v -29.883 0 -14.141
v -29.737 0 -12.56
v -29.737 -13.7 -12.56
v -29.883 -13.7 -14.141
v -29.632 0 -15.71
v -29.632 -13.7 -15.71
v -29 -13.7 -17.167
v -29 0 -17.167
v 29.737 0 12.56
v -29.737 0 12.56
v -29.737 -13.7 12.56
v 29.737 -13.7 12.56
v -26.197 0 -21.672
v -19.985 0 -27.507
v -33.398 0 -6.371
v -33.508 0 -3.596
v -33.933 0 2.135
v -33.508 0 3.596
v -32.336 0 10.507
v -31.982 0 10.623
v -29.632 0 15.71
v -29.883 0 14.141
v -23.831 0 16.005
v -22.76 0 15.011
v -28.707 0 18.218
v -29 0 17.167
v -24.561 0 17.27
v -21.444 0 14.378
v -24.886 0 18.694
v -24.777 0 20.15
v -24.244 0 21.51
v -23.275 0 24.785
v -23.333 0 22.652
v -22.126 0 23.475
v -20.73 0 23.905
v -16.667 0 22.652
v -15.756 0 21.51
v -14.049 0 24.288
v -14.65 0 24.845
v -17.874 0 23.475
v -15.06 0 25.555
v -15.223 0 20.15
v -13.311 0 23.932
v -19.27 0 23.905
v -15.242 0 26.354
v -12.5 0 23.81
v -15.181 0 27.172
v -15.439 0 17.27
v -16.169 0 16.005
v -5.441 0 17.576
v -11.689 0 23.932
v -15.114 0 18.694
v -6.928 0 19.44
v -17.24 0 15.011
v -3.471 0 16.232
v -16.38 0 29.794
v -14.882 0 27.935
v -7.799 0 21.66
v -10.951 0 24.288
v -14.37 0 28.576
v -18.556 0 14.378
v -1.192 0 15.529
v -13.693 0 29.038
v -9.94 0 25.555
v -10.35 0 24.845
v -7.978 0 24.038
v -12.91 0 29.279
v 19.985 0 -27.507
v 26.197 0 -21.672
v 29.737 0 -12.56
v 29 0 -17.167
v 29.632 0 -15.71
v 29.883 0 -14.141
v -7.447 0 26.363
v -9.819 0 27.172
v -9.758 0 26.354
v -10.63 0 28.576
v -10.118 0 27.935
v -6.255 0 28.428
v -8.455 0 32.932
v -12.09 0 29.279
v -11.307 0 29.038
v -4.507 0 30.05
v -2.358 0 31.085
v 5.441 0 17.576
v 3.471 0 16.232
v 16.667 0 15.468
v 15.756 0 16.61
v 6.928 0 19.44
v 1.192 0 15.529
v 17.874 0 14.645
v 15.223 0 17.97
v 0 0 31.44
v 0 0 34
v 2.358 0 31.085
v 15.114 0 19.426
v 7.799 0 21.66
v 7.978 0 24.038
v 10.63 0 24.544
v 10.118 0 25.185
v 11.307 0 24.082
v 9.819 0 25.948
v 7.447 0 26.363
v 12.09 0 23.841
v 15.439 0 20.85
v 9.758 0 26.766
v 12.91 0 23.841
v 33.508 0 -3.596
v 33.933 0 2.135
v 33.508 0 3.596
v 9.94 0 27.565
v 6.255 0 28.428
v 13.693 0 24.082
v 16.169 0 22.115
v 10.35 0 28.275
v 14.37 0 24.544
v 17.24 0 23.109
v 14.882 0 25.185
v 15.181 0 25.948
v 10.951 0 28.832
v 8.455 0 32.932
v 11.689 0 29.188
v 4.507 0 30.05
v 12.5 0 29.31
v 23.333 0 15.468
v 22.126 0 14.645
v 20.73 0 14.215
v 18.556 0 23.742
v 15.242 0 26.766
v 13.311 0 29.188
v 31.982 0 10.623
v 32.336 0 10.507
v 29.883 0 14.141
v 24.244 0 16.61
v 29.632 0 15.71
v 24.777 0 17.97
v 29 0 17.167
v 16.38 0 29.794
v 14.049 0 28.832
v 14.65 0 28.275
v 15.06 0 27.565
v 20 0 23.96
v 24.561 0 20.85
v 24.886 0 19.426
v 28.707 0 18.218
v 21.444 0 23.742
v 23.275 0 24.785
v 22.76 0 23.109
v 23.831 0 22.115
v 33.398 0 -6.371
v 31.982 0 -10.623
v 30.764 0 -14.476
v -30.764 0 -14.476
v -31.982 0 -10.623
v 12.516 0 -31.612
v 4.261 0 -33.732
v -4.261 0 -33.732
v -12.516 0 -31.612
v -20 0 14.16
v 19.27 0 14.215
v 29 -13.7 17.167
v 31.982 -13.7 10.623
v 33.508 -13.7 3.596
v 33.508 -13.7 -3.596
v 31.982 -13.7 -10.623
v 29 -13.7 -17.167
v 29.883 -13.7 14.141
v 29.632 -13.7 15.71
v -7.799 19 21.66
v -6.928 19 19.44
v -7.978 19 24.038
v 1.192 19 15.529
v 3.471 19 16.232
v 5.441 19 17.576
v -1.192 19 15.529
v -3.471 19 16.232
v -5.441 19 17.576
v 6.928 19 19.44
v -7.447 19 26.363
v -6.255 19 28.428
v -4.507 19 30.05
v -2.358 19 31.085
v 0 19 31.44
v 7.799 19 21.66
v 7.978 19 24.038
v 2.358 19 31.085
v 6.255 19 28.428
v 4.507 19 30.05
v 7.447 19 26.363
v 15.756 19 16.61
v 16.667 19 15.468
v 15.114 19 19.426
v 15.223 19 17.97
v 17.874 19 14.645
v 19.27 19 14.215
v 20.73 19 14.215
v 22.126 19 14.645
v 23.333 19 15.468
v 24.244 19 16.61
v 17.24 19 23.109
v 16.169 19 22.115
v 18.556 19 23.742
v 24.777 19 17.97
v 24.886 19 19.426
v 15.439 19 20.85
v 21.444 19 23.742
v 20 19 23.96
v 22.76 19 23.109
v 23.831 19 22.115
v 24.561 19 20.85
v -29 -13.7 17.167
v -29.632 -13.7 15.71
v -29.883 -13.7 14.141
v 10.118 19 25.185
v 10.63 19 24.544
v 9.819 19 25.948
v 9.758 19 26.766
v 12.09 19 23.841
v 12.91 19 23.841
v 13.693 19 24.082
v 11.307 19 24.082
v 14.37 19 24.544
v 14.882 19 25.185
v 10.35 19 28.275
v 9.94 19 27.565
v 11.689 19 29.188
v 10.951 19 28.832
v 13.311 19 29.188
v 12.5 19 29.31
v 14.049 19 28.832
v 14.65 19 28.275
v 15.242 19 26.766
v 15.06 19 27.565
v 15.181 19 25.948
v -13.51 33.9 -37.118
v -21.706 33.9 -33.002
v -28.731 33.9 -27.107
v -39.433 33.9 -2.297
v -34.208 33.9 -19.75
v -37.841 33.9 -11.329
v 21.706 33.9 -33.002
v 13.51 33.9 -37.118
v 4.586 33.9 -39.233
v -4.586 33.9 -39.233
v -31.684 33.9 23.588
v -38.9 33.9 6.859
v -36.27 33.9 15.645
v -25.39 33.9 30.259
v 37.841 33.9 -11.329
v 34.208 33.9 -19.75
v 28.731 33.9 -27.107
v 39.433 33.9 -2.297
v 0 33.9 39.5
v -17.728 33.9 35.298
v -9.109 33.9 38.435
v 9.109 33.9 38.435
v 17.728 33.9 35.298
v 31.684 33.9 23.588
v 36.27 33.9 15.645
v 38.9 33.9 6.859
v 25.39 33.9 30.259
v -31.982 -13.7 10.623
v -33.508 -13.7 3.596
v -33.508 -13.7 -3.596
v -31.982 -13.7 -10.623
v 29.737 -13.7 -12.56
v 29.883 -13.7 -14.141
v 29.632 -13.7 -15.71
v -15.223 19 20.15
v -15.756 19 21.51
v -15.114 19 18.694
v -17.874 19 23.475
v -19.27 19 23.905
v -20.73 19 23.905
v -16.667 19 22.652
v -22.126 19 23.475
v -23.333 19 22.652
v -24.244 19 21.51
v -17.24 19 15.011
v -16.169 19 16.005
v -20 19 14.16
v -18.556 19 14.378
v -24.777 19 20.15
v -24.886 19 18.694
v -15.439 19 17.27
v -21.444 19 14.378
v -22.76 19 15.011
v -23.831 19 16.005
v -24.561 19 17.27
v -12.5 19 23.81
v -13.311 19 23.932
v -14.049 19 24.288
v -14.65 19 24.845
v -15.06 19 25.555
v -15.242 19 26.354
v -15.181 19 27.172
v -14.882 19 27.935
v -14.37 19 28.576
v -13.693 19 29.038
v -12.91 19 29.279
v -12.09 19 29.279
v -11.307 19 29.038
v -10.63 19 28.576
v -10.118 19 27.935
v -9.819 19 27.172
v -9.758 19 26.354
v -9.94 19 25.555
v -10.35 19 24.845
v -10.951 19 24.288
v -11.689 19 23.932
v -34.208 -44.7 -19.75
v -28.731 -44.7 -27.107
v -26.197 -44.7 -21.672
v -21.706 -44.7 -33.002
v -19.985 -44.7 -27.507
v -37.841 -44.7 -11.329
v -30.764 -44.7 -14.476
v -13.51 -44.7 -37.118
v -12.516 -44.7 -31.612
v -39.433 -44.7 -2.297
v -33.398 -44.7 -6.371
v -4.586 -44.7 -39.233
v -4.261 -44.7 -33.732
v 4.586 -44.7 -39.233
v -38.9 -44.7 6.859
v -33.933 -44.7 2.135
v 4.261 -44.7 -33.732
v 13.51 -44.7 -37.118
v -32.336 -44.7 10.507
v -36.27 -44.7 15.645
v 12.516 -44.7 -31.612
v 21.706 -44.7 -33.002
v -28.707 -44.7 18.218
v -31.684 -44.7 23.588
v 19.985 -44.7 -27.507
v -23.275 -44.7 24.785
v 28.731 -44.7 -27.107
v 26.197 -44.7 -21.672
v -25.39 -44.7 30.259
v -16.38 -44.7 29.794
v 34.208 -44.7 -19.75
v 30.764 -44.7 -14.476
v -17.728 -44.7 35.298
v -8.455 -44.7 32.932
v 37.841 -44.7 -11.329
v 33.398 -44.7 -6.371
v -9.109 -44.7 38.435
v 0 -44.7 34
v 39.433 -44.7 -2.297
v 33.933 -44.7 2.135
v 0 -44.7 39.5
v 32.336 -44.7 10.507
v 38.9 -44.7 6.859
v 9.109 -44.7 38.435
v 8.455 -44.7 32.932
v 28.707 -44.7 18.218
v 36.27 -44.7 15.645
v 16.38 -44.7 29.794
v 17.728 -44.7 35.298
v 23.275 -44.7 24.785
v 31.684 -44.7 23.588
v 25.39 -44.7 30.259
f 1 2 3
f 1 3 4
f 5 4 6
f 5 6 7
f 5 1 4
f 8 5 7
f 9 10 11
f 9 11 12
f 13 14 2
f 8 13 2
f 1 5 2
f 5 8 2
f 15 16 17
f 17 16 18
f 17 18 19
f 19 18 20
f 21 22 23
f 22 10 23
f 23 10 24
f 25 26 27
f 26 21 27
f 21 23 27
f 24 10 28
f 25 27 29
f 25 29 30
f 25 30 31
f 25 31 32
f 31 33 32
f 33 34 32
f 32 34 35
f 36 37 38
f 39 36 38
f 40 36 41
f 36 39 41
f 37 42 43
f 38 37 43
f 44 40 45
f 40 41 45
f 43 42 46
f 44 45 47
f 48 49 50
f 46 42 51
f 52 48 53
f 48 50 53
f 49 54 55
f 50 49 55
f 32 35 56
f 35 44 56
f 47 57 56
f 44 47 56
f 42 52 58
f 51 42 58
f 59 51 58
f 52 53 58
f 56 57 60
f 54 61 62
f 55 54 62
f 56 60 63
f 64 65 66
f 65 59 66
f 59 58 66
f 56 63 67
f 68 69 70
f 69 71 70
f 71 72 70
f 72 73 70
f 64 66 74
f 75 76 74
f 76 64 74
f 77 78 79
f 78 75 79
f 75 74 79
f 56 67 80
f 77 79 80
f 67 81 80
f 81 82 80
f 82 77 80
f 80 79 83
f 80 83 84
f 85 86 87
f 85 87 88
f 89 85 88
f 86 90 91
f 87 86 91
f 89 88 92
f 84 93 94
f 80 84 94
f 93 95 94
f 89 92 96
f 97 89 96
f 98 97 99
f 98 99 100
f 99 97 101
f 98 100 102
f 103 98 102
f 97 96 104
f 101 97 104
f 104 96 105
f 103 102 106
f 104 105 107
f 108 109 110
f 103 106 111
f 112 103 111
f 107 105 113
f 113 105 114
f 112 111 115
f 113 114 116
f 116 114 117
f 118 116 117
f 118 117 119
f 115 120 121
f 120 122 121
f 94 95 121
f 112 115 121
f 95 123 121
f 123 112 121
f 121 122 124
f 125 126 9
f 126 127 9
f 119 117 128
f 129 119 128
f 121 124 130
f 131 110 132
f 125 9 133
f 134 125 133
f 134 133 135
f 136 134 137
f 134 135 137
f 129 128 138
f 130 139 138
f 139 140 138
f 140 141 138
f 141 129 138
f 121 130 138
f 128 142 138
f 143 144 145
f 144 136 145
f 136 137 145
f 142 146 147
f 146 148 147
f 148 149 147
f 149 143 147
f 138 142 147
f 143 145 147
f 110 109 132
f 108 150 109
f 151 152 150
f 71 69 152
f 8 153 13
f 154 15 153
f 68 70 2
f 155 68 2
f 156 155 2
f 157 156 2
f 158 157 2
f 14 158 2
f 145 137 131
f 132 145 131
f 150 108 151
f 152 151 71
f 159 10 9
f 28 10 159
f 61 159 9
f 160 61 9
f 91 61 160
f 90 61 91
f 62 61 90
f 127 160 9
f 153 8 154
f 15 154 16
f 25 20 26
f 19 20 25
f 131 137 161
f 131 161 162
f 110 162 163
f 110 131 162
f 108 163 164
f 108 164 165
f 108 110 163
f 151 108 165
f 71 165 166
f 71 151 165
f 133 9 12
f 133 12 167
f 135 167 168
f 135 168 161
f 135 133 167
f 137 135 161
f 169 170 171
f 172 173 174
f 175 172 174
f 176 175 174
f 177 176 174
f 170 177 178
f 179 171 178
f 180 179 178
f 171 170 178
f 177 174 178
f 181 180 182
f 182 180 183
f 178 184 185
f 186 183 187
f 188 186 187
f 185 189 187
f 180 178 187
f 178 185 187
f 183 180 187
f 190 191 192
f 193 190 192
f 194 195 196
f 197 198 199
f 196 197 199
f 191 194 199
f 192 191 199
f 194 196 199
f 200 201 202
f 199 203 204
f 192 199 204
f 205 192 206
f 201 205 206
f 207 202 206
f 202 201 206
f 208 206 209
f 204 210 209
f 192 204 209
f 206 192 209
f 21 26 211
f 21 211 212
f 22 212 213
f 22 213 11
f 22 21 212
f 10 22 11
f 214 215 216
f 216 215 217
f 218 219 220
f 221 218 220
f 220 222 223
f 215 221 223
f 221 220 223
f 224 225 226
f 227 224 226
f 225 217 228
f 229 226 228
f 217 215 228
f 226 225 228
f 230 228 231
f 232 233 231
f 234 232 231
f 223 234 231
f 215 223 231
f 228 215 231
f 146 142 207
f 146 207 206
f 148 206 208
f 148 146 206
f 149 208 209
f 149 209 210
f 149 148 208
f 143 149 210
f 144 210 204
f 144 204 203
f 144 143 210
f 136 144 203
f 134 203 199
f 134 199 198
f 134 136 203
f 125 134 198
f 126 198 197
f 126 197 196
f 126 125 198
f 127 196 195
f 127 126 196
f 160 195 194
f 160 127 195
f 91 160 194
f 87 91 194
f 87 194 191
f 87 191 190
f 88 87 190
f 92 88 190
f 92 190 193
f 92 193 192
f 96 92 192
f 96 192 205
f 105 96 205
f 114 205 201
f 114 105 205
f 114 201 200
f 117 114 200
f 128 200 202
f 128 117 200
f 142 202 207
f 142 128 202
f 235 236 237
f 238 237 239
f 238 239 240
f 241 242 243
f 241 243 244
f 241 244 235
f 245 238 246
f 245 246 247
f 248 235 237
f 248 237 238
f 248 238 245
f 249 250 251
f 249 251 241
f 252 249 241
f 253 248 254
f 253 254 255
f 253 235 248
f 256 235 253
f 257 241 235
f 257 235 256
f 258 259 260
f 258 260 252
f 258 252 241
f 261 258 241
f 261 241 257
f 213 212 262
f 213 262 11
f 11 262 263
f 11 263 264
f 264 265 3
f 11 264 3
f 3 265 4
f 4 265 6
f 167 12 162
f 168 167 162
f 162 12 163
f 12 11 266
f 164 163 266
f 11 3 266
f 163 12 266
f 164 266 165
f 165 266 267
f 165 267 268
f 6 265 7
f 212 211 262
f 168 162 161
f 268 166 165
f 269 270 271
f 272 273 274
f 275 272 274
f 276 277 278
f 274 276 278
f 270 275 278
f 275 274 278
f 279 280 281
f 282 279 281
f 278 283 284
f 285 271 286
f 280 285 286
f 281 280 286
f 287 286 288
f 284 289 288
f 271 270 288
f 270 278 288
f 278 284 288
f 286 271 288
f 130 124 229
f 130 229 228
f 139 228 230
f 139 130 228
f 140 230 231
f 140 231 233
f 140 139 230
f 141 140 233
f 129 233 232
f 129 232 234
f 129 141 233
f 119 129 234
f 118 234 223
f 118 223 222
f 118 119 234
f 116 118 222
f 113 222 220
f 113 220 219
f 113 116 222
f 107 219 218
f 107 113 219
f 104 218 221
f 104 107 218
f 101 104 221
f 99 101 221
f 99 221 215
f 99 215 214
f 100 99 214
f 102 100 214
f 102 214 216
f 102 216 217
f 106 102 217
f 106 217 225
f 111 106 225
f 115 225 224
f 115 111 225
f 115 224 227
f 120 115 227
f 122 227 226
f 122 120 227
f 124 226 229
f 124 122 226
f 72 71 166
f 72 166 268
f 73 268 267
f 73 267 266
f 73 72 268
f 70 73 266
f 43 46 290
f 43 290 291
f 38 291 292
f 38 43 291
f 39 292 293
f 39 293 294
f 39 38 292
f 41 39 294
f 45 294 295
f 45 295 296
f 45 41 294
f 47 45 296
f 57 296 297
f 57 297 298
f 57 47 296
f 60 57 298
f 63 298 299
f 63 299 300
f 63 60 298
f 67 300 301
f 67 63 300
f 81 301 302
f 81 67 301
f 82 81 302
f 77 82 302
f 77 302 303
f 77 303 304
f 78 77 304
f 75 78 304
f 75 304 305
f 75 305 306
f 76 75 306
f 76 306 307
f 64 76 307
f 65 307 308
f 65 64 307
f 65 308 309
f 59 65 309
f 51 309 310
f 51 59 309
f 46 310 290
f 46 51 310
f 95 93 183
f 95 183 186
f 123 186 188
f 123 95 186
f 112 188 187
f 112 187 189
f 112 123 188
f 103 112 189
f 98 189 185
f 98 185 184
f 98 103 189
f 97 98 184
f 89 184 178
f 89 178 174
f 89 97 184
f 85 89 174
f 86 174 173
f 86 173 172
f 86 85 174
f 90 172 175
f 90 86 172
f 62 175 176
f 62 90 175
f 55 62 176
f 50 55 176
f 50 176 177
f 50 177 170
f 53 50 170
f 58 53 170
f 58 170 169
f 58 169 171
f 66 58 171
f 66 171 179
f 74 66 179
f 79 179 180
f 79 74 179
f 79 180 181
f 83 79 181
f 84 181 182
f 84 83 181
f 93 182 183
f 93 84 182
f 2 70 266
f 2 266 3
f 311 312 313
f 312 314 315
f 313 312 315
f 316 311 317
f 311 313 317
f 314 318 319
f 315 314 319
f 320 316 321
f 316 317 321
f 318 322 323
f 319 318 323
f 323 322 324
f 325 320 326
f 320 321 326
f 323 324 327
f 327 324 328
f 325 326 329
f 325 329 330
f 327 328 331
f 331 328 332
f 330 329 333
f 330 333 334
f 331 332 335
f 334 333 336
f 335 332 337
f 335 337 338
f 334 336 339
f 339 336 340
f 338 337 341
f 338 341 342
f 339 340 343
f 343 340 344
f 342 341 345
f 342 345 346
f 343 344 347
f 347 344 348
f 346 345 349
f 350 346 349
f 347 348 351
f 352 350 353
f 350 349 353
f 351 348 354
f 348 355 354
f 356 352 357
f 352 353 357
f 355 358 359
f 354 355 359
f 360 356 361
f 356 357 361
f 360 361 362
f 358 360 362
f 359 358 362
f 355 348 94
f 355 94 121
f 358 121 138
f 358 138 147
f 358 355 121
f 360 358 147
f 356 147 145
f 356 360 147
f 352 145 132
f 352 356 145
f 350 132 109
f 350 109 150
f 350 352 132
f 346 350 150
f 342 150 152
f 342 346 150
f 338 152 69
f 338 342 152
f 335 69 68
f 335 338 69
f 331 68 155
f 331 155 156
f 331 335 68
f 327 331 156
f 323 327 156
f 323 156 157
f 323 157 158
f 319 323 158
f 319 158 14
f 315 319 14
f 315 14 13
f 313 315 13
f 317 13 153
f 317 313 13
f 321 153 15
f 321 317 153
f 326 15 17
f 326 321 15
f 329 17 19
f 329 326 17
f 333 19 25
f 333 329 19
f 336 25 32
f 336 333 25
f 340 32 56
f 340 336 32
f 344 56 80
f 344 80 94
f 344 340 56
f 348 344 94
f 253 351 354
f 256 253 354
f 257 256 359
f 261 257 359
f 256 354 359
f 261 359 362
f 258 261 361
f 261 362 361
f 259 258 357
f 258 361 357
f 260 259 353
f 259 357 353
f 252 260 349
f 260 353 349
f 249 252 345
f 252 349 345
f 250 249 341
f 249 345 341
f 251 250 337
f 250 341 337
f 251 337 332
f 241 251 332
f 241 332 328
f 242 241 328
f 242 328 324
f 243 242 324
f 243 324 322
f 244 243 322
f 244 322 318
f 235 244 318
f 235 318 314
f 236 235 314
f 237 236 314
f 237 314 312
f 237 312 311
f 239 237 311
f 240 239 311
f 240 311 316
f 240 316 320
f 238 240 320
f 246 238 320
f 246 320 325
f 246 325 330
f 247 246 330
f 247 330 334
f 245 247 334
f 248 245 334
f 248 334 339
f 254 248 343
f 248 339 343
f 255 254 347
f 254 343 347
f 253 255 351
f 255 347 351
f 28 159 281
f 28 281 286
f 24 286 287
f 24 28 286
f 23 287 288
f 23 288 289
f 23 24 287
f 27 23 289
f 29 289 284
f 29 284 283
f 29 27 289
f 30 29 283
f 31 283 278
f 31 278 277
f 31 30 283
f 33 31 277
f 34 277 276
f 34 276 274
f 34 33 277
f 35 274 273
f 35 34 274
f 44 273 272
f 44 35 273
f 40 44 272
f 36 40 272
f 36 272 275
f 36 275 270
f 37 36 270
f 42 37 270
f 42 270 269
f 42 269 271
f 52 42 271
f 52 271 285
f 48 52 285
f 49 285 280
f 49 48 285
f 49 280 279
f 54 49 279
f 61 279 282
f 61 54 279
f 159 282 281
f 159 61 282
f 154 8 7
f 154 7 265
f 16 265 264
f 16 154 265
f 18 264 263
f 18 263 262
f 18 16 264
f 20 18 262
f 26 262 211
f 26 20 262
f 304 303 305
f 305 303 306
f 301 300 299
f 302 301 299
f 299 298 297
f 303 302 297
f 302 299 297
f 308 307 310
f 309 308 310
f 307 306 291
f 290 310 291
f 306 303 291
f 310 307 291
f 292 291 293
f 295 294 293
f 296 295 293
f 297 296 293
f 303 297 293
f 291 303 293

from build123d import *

# Parameters (mm, degrees)
SKETCH1_R           = 39.5
BOSS_EXTRUDE1_DEPTH = 33.9
BOSS_EXTRUDE3_DEPTH = 13.7
BOSS_EXTRUDE4_START = -44.7
SKETCH7_R           = 39.5
SKETCH7_R_2         = 34
BOSS_EXTRUDE4_DEPTH = 44.7
SKETCH8_R           = 8
SKETCH8_R_2         = 2.75
SKETCH8_R_3         = 4.9
CUT_EXTRUDE2_DEPTH  = 19


with BuildPart() as part:
    # Sketch1 → Boss-Extrude1 (new body)
    with BuildSketch(Plane(origin=(0, 0, 0), x_dir=(1, 0, 0), z_dir=(0, 1, 0))):
        with Locations(Location((0, 0, 0), (0, 0, 270))):
            Circle(SKETCH1_R)
    extrude(amount=BOSS_EXTRUDE1_DEPTH)

    # Sketch6 → Boss-Extrude3 (add)
    with BuildSketch(Plane(origin=(0, 0, 0), x_dir=(1, 0, 0), z_dir=(0, 1, 0))):
        with BuildLine():
            Line((29.737090224, 12.56), (-29.737090224, 12.56))
            ThreePointArc((-29.737090224, 12.56), (-29.806512789, 14.933347645), (-29, 17.166537216))
            ThreePointArc((-29, 17.166537216), (-33.7, 0), (-29, -17.166537216))
            ThreePointArc((-29, -17.166537216), (-29.806512789, -14.933347645), (-29.737090224, -12.56))
            Line((-29.737090224, -12.56), (29.737090224, -12.56))
            ThreePointArc((29.737090224, -12.56), (29.806512789, -14.933347645), (29, -17.166537216))
            ThreePointArc((29, -17.166537216), (33.7, 0), (29, 17.166537216))
            ThreePointArc((29, 17.166537216), (29.806512789, 14.933347645), (29.737090224, 12.56))
        make_face()
    extrude(amount=-BOSS_EXTRUDE3_DEPTH)

    # Sketch7 → Boss-Extrude4 (add)
    with BuildSketch(Plane(origin=(0, 0, 0), x_dir=(1, 0, 0), z_dir=(0, 1, 0)).offset(BOSS_EXTRUDE4_START)):
        with Locations(Location((0, 0, 0), (0, 0, 270))):
            Circle(SKETCH7_R)
        with Locations(Location((0, 0, 0), (0, 0, 270))):
            Circle(SKETCH7_R_2, mode=Mode.SUBTRACT)
    extrude(amount=BOSS_EXTRUDE4_DEPTH)

    # Sketch8 → Cut-Extrude2 (cut)
    with BuildSketch(Plane(origin=(0, 0, 0), x_dir=(1, 0, 0), z_dir=(0, 1, 0))):
        with Locations(Location((0, -23.44, 0), (0, 0, 270))):
            Circle(SKETCH8_R)
        with Locations(Location((12.5, -26.56, 0), (0, 0, 270))):
            Circle(SKETCH8_R_2)
        with Locations(Location((20, -19.06, 0), (0, 0, 270))):
            Circle(SKETCH8_R_3)
        with Locations(Location((-12.5, -26.56, 0), (0, 0, 90))):
            Circle(SKETCH8_R_2)
        with Locations(Location((-20, -19.06, 0), (0, 0, 90))):
            Circle(SKETCH8_R_3)
    extrude(amount=CUT_EXTRUDE2_DEPTH, mode=Mode.SUBTRACT)


solid = part.part
